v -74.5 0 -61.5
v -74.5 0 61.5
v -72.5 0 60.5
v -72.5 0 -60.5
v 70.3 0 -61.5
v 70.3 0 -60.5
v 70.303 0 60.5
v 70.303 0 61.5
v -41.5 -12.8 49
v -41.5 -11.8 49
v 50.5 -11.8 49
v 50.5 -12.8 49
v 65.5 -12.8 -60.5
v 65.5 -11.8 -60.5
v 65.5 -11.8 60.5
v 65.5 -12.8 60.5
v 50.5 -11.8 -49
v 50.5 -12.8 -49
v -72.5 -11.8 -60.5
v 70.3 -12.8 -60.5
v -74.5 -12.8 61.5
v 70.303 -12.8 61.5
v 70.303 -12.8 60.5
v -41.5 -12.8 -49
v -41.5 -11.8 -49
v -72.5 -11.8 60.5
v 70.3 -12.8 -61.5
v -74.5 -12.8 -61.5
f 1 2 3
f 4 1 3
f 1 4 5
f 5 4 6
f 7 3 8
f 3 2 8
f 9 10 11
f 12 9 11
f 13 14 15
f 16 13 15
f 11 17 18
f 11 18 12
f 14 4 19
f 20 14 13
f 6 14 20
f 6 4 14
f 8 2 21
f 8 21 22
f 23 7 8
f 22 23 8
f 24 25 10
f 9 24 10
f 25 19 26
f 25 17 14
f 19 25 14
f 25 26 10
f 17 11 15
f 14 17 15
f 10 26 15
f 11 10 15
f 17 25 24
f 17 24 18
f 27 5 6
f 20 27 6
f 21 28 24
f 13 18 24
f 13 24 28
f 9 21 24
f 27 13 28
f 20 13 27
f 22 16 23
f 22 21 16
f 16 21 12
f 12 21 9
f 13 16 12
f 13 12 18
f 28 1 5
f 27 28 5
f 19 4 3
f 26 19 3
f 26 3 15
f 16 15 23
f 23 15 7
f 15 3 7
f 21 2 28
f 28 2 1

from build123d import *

# Parameters (mm, degrees)
F0_W     = 138
F0_H     = 121
F0_W_2   = 92
F0_H_2   = 98
F1_DEPTH = 12.8
F2_DEPTH = 11.8
F3_DEPTH = 12.8
F0_W_3   = 4.8031793237
F0_H_3   = 1
F0_W_4   = 4.8
F4_DEPTH = 12.8


with BuildPart() as f1:
    # F0 (on Front) → F1 (new body)
    with BuildSketch(Plane.XZ):
        with Locations((-3.5, 0)):
            Rectangle(F0_W, F0_H)
        with Locations((4.5, 0)):
            Rectangle(F0_W_2, F0_H_2, mode=Mode.SUBTRACT)
        with Locations((4.5, 0)):
            Rectangle(F0_W_2, F0_H_2)
        Polygon((-74.5, 61.5), (-74.5, -61.5), (65.5, -61.5), (65.5, -60.5), (-72.5, -60.5), (-72.5, 60.5), (65.5, 60.5), (65.5, 61.5), align=None)
    extrude(amount=F1_DEPTH)

    # F0 (on Front) → F2 (cut)
    with BuildSketch(Plane.XZ):
        with Locations((-3.5, 0)):
            Rectangle(F0_W, F0_H)
        with Locations((4.5, 0)):
            Rectangle(F0_W_2, F0_H_2, mode=Mode.SUBTRACT)
        with Locations((4.5, 0)):
            Rectangle(F0_W_2, F0_H_2)
    extrude(amount=F2_DEPTH, mode=Mode.SUBTRACT)

    # F0 (on Front) → F3 (cut)
    with BuildSketch(Plane.XZ):
        with Locations((4.5, 0)):
            Rectangle(F0_W_2, F0_H_2)
    extrude(amount=F3_DEPTH, mode=Mode.SUBTRACT)

    # F0 (on Front) → F4 (join)
    with BuildSketch(Plane.XZ):
        with Locations((67.9015896618, 61)):
            Rectangle(F0_W_3, F0_H_3)
        with Locations((67.9, -61)):
            Rectangle(F0_W_4, F0_H_3)
    extrude(amount=F4_DEPTH)


solid = f1.part
